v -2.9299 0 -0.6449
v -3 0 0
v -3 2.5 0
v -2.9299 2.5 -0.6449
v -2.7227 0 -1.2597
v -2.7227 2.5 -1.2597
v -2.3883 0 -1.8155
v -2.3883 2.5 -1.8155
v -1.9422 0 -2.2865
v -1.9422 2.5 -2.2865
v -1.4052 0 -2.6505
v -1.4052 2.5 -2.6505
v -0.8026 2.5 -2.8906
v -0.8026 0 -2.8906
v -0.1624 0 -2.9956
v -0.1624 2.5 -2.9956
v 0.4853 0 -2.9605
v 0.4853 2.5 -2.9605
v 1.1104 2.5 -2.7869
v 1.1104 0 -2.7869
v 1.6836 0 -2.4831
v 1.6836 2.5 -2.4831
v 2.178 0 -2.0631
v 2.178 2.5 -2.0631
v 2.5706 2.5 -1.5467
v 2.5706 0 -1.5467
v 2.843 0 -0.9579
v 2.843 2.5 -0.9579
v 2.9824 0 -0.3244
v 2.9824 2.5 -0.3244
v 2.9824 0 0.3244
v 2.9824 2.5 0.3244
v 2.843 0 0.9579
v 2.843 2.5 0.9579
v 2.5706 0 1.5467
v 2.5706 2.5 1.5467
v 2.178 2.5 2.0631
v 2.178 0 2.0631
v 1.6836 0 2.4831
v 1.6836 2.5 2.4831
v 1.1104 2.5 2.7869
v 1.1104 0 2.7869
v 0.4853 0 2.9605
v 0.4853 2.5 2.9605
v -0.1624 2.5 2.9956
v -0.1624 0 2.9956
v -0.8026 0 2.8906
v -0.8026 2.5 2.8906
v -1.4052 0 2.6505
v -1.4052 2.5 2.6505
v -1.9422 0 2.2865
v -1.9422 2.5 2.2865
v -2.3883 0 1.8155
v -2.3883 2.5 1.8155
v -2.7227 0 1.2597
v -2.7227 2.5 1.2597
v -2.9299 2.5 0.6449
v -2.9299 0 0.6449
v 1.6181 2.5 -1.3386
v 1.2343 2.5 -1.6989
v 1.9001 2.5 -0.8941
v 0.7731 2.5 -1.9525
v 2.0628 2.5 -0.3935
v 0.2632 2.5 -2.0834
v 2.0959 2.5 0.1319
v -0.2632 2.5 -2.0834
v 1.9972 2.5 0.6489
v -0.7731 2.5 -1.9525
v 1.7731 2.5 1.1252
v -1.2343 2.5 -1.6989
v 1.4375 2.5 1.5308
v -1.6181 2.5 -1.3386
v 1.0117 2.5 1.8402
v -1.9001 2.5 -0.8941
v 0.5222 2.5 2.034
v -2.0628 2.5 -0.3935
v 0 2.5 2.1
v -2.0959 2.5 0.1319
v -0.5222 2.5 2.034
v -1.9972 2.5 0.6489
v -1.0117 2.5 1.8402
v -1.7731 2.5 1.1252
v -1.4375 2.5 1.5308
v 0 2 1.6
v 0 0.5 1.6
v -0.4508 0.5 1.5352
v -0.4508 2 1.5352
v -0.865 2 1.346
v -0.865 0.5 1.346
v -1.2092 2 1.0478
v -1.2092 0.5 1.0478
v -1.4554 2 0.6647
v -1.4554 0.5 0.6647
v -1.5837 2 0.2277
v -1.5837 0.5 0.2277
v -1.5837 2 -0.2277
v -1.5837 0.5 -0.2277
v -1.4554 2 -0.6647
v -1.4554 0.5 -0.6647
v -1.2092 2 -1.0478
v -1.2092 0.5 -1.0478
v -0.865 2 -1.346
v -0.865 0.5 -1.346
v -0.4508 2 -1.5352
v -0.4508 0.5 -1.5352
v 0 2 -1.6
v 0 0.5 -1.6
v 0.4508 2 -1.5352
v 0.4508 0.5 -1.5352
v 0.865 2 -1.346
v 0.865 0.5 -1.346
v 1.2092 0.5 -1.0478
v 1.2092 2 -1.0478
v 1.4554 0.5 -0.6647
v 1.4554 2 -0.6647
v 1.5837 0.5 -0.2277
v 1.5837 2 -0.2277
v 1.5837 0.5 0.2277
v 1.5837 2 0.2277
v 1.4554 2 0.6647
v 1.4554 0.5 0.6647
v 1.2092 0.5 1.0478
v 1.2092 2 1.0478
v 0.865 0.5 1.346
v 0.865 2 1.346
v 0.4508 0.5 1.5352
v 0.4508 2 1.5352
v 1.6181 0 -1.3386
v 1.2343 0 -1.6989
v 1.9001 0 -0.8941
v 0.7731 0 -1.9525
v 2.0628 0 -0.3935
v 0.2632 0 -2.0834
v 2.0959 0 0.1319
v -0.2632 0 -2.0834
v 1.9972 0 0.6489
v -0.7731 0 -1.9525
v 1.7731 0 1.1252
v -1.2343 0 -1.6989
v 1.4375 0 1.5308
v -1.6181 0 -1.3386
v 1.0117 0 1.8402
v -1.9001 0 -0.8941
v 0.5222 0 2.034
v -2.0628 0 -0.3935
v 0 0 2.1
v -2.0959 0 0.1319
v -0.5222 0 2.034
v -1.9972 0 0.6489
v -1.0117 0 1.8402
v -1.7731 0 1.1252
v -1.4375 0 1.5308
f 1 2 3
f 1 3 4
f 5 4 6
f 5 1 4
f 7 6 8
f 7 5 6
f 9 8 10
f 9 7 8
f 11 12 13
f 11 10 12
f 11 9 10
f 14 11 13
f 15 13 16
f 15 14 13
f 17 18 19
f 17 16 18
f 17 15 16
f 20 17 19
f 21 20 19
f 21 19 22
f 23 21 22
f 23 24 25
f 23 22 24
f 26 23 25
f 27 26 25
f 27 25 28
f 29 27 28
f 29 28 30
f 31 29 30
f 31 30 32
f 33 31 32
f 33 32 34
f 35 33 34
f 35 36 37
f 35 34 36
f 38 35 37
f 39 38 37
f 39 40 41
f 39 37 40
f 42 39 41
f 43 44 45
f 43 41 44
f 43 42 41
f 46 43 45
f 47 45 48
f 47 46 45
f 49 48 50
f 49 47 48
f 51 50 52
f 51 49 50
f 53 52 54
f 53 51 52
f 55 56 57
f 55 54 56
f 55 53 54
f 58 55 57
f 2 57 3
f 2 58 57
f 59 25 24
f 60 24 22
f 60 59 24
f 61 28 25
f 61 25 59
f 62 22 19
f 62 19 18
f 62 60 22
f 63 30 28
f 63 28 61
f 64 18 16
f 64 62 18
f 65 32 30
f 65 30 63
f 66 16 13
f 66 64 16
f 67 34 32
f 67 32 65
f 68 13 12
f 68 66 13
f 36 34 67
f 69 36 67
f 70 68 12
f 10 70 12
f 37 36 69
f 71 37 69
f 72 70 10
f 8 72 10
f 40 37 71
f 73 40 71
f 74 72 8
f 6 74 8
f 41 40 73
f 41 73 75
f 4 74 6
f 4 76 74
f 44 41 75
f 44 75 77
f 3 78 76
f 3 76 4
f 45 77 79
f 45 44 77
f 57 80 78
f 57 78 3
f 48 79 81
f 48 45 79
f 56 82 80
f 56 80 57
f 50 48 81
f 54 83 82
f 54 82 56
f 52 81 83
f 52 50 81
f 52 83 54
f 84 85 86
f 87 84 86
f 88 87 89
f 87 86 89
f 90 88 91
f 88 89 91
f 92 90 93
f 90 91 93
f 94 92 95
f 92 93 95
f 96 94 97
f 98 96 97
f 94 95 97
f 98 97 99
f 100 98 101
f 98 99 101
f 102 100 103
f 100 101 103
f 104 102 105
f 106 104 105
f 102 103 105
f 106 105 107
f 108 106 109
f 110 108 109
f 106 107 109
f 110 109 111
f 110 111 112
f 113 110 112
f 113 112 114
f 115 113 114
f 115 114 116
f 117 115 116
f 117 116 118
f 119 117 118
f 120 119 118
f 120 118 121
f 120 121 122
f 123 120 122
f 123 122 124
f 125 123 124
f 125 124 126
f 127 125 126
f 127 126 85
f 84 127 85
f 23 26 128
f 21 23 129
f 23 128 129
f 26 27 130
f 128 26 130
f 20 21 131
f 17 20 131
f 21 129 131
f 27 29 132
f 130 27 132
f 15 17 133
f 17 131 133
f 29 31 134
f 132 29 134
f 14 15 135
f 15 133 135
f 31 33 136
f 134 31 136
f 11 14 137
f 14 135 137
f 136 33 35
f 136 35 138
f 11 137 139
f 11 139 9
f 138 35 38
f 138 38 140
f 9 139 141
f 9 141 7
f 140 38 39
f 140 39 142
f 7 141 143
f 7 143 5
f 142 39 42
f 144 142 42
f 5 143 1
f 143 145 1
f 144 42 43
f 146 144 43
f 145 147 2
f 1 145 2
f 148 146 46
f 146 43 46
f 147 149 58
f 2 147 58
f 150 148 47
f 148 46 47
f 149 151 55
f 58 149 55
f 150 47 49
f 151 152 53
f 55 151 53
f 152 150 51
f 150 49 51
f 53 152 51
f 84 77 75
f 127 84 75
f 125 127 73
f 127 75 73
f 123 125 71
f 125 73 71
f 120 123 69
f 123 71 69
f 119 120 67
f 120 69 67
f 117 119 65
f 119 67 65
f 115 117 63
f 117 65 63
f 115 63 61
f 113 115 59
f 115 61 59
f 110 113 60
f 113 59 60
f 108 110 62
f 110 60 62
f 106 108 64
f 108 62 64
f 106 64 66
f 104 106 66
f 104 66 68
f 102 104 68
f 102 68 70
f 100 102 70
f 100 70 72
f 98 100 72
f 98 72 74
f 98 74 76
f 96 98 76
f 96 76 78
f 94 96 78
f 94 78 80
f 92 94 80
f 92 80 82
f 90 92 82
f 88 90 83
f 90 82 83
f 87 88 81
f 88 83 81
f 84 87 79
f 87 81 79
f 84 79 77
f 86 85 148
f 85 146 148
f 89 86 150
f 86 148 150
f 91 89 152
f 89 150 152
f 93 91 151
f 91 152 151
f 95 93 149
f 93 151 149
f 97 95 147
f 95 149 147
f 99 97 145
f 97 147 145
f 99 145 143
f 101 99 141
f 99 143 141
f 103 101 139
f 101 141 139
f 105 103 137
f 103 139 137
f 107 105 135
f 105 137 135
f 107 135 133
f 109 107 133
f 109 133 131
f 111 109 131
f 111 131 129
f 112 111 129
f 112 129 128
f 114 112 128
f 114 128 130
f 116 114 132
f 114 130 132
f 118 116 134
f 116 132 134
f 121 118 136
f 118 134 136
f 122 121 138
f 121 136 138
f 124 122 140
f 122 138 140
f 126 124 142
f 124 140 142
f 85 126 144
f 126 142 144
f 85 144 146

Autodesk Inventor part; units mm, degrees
ref_plane "YZ Plane" through (0, 0, 0) normal (1, 0, 0) x (0, 1, 0)
ref_plane "XZ Plane" through (0, 0, 0) normal (0, 1, 0) x (-1, 0, 0)
ref_plane "XY Plane" through (0, 0, 0) normal (0, 0, 1) x (1, 0, 0)
sketch "Sketch1" plane through (0, 0, 0) normal (0, 1, 0) x (-1, 0, 0)
  circle A0 centre (0, 0) radius 3
  dimension "d0" = 6
extrude "Extrusion1" add sketch "Sketch1" along normal blind 2.5
sketch "Sketch2" plane through (0, 2.5, 0) normal (0, 1, 0) x (1, 0, 0)
  circle A0 centre (0, 0) radius 3 projected
hole "Hole1" at (0, 2.5, 0) direction (0, -1, 0) diameter 3.2 end through all
chamfer "Chamfer1" distance 0.5 angle 45 2 edges at (0, 2.5, -1.6) (0, 0, -1.6)
properties part number "plastic M3 nut"
